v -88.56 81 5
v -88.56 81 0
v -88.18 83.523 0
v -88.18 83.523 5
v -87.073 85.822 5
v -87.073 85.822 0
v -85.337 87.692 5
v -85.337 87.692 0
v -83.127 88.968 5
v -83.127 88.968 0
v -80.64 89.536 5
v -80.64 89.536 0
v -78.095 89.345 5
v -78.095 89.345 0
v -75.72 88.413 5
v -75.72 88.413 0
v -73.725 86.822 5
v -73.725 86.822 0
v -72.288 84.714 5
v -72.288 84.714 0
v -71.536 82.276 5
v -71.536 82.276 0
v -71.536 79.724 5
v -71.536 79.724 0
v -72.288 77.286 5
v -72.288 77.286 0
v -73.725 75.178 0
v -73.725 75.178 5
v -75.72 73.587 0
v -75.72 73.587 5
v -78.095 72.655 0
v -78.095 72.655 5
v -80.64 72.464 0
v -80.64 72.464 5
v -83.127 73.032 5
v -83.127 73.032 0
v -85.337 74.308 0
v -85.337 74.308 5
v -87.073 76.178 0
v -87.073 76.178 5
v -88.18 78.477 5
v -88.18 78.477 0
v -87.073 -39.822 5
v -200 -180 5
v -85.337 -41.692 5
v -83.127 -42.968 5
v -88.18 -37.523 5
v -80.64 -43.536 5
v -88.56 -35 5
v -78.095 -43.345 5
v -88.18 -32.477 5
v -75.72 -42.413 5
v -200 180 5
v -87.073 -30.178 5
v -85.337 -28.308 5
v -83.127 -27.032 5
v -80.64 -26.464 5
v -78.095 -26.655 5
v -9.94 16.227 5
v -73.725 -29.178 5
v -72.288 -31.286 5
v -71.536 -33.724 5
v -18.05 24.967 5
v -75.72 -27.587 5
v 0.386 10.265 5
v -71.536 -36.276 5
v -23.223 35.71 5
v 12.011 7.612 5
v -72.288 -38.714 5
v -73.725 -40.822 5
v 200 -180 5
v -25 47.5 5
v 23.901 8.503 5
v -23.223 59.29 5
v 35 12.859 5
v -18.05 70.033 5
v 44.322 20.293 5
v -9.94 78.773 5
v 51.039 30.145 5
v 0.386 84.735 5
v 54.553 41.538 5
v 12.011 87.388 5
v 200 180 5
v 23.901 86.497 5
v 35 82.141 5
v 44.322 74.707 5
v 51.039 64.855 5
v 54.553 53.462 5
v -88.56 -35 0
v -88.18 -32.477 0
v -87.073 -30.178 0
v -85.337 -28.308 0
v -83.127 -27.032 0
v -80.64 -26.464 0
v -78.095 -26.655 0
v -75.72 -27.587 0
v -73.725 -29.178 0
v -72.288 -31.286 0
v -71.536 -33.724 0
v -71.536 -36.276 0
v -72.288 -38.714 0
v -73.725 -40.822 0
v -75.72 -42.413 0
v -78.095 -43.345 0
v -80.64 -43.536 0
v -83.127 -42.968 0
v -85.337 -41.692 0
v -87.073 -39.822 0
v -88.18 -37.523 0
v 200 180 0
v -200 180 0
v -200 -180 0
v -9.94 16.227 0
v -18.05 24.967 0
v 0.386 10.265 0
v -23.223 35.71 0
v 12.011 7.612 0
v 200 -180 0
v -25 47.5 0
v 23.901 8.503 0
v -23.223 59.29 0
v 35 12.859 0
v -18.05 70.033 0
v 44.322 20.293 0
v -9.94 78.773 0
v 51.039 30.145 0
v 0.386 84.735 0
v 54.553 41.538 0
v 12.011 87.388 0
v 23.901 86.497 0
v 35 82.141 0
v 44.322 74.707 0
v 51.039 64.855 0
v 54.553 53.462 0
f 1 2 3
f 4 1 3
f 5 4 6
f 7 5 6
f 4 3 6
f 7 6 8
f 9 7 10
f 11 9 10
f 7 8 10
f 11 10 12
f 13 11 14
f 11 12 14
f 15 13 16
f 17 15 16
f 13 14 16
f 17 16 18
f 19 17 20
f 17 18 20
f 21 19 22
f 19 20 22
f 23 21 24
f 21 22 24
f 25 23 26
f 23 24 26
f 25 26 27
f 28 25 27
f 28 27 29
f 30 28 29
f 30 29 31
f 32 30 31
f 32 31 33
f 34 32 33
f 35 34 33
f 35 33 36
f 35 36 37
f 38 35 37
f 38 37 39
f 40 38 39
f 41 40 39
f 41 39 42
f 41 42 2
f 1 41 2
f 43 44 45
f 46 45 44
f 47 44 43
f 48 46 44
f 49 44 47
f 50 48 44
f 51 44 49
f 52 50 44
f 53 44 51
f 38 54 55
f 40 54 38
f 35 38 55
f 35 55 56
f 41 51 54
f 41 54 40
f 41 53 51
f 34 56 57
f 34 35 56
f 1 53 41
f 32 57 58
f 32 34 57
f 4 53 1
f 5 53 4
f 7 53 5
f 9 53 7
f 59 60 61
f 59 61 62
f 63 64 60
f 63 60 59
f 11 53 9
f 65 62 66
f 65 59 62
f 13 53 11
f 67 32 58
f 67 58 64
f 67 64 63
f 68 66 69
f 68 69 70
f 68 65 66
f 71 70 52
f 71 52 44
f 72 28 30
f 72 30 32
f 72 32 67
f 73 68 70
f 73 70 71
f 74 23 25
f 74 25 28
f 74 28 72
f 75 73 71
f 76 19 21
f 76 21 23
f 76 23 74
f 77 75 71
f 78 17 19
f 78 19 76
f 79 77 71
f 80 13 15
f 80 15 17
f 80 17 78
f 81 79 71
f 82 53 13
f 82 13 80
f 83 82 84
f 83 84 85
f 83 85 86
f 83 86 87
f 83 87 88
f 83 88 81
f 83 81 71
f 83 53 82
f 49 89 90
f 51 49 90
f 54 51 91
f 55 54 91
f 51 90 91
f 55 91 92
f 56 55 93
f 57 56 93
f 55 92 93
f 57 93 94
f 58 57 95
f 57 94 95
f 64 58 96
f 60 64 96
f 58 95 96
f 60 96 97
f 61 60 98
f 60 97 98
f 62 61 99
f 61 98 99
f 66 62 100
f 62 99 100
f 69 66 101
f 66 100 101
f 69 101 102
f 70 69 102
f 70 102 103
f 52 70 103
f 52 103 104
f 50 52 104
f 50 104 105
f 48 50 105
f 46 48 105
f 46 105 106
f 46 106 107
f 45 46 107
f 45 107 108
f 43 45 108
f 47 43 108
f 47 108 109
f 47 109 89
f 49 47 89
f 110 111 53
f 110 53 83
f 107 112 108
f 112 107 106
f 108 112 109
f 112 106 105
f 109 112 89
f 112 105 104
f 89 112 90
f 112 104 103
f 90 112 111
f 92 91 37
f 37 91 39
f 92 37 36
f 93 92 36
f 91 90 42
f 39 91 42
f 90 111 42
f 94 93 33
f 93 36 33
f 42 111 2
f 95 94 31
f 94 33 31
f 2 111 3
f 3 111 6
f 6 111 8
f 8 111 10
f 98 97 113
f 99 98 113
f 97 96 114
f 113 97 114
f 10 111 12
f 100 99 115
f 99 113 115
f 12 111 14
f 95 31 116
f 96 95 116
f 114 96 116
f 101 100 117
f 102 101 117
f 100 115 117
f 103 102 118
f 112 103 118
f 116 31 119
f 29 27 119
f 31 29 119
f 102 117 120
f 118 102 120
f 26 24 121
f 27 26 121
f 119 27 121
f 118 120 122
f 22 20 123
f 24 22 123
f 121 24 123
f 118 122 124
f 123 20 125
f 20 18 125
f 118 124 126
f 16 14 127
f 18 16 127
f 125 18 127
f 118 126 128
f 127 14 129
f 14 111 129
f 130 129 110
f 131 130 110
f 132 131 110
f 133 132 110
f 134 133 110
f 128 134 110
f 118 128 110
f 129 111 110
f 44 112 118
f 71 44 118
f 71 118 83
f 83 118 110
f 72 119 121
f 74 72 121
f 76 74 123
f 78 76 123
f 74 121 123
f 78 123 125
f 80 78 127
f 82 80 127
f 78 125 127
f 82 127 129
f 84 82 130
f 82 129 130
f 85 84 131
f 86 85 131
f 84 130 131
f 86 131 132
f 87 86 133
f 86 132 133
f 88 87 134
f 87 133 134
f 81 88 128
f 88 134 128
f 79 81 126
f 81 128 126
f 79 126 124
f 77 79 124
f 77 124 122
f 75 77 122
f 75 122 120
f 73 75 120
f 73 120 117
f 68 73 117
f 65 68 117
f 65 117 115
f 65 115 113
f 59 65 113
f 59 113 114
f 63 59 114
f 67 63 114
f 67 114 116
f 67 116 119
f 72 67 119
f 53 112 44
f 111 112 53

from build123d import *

# Parameters (mm, degrees)
ESQUISSE1_W             = 400
ESQUISSE1_H             = 360
BOSS_EXTRU_1_DEPTH      = 5
ESQUISSE5_R             = 8.56
ENL_V_MAT_EXTRU_3_DEPTH = 10
ESQUISSE6_R             = 40
ENL_V_MAT_EXTRU_4_DEPTH = 10


with BuildPart() as part:
    # Esquisse1 → Boss.-Extru.1 (new body)
    with BuildSketch(Plane.XY):
        Rectangle(ESQUISSE1_W, ESQUISSE1_H)
    extrude(amount=BOSS_EXTRU_1_DEPTH)

    # Esquisse5 → Enlèv. mat.-Extru.3 (cut)
    with BuildSketch(Plane(origin=(0, 0, 0), x_dir=(-1, 0, 0), z_dir=(0, 0, -1))):
        with Locations((80, 81)):
            Circle(ESQUISSE5_R)
        with Locations((80, -35)):
            Circle(ESQUISSE5_R)
    extrude(amount=-ENL_V_MAT_EXTRU_3_DEPTH, mode=Mode.SUBTRACT)

    # Esquisse6 → Enlèv. mat.-Extru.4 (cut)
    with BuildSketch(Plane(origin=(0, 0, 0), x_dir=(-1, 0, 0), z_dir=(0, 0, -1))):
        with Locations((-15, 47.5)):
            Circle(ESQUISSE6_R)
    extrude(amount=-ENL_V_MAT_EXTRU_4_DEPTH, mode=Mode.SUBTRACT)


solid = part.part
